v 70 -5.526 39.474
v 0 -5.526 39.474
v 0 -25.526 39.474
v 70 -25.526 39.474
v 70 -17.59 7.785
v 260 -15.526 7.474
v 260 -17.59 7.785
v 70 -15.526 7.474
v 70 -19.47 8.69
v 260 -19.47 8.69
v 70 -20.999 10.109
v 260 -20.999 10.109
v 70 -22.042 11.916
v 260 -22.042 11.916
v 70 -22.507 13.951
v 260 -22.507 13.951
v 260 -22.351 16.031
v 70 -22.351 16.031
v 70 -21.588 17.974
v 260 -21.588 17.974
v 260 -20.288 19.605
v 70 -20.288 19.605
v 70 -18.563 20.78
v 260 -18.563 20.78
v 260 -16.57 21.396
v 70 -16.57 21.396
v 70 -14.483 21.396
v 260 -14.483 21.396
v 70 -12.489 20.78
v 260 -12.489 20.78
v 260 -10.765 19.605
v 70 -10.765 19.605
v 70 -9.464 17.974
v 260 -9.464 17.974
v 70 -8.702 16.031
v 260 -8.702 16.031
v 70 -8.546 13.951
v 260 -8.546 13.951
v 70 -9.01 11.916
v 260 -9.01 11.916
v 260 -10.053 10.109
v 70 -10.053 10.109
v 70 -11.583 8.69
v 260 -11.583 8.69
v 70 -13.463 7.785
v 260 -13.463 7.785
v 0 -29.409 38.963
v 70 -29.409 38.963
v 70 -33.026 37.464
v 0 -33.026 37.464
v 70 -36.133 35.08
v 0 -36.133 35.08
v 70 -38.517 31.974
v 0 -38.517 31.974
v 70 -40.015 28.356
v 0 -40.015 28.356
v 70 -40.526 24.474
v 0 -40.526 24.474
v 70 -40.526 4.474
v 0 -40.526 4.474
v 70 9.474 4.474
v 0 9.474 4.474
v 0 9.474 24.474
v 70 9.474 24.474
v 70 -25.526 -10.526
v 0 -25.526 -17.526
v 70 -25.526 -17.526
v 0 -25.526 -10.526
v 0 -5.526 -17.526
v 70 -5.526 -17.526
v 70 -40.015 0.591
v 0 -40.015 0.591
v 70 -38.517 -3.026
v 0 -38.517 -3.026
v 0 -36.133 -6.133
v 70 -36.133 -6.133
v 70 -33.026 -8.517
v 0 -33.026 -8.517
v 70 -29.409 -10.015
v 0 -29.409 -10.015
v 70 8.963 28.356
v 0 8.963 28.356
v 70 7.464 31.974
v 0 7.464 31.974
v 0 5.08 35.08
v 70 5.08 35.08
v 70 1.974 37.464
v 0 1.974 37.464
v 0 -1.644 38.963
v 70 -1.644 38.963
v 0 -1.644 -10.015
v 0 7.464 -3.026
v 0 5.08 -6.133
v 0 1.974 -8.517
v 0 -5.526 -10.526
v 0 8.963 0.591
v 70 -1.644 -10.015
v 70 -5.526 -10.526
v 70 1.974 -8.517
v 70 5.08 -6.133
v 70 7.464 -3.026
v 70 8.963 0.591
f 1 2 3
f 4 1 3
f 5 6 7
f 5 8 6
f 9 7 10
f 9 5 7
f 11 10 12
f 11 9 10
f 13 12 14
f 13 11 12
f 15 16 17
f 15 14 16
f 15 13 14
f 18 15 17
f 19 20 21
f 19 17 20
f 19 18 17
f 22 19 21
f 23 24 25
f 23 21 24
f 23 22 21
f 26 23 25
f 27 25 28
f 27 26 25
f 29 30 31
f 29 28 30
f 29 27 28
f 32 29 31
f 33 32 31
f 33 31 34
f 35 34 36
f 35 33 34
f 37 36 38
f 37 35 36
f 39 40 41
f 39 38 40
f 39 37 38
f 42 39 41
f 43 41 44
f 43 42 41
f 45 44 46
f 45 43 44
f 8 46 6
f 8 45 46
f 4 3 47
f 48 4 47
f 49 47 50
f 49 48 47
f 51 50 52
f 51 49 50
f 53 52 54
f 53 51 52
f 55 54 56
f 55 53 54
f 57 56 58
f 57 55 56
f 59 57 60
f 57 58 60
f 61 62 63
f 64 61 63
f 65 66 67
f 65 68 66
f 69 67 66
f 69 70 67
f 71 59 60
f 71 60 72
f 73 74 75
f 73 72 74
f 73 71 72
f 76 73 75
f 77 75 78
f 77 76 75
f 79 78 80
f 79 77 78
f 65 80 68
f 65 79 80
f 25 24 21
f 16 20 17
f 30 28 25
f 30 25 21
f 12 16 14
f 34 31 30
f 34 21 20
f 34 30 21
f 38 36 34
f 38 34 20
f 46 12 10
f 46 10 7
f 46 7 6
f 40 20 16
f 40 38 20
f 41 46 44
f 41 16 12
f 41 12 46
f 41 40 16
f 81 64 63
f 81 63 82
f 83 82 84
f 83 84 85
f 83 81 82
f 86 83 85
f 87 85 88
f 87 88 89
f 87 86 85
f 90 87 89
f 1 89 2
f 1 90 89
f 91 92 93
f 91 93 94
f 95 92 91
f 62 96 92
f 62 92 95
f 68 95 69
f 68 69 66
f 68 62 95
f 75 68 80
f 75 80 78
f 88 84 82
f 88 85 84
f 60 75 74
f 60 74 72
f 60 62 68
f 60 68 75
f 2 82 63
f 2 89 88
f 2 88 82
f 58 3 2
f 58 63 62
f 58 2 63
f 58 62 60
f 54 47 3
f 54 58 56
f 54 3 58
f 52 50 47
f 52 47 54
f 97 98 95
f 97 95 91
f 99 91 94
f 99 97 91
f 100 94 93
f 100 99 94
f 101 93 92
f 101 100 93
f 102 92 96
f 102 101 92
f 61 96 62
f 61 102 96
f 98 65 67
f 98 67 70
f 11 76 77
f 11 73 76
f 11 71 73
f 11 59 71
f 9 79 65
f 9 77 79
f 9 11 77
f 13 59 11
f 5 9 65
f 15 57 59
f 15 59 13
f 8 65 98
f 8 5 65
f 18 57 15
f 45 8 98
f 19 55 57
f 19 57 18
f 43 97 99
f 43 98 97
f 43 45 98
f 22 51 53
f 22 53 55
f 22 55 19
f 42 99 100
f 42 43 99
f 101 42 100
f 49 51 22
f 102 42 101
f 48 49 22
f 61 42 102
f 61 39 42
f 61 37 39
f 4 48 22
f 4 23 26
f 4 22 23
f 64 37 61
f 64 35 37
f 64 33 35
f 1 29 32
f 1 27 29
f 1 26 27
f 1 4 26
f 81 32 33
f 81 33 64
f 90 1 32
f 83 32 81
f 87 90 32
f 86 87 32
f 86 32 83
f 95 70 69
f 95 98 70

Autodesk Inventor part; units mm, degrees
ref_plane "YZ Plane" through (0, 0, 0) normal (1, 0, 0) x (0, 1, 0)
ref_plane "XZ Plane" through (0, 0, 0) normal (0, 1, 0) x (-1, 0, 0)
ref_plane "XY Plane" through (0, 0, 0) normal (0, 0, 1) x (1, 0, 0)
sketch "Sketch1" plane through (0, 0, 0) normal (1, 0, 0) x (0, 1, 0)
  line L0 (9.4737, 39.4737) -> (-40.5263, 39.4737)
  line L1 (-40.5263, 39.4737) -> (-40.5263, -10.5263)
  line L2 (-40.5263, -10.5263) -> (9.4737, -10.5263)
  line L3 (9.4737, -10.5263) -> (9.4737, 39.4737)
  point P0 (0, 0)
  dimension "d2" = 50
  dimension "d3" = 50
extrude "Extrusion1" add sketch "Sketch1" along normal blind 70
sketch "Sketch2" plane through (70, 0, 0) normal (1, 0, 0) x (0, 0, -1)
  line L0 (-39.4737, 9.4737) -> (-39.4737, -40.5263) projected
  line L1 (-39.4737, -40.5263) -> (10.5263, -40.5263) projected
  line L2 (10.5263, 9.4737) -> (-39.4737, 9.4737) projected
  line L3 (10.5263, -40.5263) -> (10.5263, 9.4737) projected
  circle A0 centre (-14.4737, -15.5263) radius 7
  point P0 (0, 0)
  dimension "d11" = 14
extrude "Extrusion2" add sketch "Sketch2" along normal blind 190 contours A0
fillet "Fillet1" radius 15 4 edges at (35, 9.4737, 39.4737) (35, -40.5263, 39.4737) (35, 9.4737, -10.5263) (35, -40.5263, -10.5263)
sketch "Sketch3" plane through (0, -25.5263, -10.5263) normal (0, 0, -1) x (-1, 0, 0)
  line L0 (-70, 20) -> (-70, 35) projected
  line L1 (-70, 20) -> (0, 20)
  line L2 (0, 20) -> (0, 0)
  line L3 (0, 0) -> (-70, 0)
  line L4 (-70, 0) -> (-70, 20)
  point P0 (0, 25.5263)
extrude "Extrusion3" add sketch "Sketch3" along normal blind 7
properties part number "taladro" material "Iron, Ductile"
